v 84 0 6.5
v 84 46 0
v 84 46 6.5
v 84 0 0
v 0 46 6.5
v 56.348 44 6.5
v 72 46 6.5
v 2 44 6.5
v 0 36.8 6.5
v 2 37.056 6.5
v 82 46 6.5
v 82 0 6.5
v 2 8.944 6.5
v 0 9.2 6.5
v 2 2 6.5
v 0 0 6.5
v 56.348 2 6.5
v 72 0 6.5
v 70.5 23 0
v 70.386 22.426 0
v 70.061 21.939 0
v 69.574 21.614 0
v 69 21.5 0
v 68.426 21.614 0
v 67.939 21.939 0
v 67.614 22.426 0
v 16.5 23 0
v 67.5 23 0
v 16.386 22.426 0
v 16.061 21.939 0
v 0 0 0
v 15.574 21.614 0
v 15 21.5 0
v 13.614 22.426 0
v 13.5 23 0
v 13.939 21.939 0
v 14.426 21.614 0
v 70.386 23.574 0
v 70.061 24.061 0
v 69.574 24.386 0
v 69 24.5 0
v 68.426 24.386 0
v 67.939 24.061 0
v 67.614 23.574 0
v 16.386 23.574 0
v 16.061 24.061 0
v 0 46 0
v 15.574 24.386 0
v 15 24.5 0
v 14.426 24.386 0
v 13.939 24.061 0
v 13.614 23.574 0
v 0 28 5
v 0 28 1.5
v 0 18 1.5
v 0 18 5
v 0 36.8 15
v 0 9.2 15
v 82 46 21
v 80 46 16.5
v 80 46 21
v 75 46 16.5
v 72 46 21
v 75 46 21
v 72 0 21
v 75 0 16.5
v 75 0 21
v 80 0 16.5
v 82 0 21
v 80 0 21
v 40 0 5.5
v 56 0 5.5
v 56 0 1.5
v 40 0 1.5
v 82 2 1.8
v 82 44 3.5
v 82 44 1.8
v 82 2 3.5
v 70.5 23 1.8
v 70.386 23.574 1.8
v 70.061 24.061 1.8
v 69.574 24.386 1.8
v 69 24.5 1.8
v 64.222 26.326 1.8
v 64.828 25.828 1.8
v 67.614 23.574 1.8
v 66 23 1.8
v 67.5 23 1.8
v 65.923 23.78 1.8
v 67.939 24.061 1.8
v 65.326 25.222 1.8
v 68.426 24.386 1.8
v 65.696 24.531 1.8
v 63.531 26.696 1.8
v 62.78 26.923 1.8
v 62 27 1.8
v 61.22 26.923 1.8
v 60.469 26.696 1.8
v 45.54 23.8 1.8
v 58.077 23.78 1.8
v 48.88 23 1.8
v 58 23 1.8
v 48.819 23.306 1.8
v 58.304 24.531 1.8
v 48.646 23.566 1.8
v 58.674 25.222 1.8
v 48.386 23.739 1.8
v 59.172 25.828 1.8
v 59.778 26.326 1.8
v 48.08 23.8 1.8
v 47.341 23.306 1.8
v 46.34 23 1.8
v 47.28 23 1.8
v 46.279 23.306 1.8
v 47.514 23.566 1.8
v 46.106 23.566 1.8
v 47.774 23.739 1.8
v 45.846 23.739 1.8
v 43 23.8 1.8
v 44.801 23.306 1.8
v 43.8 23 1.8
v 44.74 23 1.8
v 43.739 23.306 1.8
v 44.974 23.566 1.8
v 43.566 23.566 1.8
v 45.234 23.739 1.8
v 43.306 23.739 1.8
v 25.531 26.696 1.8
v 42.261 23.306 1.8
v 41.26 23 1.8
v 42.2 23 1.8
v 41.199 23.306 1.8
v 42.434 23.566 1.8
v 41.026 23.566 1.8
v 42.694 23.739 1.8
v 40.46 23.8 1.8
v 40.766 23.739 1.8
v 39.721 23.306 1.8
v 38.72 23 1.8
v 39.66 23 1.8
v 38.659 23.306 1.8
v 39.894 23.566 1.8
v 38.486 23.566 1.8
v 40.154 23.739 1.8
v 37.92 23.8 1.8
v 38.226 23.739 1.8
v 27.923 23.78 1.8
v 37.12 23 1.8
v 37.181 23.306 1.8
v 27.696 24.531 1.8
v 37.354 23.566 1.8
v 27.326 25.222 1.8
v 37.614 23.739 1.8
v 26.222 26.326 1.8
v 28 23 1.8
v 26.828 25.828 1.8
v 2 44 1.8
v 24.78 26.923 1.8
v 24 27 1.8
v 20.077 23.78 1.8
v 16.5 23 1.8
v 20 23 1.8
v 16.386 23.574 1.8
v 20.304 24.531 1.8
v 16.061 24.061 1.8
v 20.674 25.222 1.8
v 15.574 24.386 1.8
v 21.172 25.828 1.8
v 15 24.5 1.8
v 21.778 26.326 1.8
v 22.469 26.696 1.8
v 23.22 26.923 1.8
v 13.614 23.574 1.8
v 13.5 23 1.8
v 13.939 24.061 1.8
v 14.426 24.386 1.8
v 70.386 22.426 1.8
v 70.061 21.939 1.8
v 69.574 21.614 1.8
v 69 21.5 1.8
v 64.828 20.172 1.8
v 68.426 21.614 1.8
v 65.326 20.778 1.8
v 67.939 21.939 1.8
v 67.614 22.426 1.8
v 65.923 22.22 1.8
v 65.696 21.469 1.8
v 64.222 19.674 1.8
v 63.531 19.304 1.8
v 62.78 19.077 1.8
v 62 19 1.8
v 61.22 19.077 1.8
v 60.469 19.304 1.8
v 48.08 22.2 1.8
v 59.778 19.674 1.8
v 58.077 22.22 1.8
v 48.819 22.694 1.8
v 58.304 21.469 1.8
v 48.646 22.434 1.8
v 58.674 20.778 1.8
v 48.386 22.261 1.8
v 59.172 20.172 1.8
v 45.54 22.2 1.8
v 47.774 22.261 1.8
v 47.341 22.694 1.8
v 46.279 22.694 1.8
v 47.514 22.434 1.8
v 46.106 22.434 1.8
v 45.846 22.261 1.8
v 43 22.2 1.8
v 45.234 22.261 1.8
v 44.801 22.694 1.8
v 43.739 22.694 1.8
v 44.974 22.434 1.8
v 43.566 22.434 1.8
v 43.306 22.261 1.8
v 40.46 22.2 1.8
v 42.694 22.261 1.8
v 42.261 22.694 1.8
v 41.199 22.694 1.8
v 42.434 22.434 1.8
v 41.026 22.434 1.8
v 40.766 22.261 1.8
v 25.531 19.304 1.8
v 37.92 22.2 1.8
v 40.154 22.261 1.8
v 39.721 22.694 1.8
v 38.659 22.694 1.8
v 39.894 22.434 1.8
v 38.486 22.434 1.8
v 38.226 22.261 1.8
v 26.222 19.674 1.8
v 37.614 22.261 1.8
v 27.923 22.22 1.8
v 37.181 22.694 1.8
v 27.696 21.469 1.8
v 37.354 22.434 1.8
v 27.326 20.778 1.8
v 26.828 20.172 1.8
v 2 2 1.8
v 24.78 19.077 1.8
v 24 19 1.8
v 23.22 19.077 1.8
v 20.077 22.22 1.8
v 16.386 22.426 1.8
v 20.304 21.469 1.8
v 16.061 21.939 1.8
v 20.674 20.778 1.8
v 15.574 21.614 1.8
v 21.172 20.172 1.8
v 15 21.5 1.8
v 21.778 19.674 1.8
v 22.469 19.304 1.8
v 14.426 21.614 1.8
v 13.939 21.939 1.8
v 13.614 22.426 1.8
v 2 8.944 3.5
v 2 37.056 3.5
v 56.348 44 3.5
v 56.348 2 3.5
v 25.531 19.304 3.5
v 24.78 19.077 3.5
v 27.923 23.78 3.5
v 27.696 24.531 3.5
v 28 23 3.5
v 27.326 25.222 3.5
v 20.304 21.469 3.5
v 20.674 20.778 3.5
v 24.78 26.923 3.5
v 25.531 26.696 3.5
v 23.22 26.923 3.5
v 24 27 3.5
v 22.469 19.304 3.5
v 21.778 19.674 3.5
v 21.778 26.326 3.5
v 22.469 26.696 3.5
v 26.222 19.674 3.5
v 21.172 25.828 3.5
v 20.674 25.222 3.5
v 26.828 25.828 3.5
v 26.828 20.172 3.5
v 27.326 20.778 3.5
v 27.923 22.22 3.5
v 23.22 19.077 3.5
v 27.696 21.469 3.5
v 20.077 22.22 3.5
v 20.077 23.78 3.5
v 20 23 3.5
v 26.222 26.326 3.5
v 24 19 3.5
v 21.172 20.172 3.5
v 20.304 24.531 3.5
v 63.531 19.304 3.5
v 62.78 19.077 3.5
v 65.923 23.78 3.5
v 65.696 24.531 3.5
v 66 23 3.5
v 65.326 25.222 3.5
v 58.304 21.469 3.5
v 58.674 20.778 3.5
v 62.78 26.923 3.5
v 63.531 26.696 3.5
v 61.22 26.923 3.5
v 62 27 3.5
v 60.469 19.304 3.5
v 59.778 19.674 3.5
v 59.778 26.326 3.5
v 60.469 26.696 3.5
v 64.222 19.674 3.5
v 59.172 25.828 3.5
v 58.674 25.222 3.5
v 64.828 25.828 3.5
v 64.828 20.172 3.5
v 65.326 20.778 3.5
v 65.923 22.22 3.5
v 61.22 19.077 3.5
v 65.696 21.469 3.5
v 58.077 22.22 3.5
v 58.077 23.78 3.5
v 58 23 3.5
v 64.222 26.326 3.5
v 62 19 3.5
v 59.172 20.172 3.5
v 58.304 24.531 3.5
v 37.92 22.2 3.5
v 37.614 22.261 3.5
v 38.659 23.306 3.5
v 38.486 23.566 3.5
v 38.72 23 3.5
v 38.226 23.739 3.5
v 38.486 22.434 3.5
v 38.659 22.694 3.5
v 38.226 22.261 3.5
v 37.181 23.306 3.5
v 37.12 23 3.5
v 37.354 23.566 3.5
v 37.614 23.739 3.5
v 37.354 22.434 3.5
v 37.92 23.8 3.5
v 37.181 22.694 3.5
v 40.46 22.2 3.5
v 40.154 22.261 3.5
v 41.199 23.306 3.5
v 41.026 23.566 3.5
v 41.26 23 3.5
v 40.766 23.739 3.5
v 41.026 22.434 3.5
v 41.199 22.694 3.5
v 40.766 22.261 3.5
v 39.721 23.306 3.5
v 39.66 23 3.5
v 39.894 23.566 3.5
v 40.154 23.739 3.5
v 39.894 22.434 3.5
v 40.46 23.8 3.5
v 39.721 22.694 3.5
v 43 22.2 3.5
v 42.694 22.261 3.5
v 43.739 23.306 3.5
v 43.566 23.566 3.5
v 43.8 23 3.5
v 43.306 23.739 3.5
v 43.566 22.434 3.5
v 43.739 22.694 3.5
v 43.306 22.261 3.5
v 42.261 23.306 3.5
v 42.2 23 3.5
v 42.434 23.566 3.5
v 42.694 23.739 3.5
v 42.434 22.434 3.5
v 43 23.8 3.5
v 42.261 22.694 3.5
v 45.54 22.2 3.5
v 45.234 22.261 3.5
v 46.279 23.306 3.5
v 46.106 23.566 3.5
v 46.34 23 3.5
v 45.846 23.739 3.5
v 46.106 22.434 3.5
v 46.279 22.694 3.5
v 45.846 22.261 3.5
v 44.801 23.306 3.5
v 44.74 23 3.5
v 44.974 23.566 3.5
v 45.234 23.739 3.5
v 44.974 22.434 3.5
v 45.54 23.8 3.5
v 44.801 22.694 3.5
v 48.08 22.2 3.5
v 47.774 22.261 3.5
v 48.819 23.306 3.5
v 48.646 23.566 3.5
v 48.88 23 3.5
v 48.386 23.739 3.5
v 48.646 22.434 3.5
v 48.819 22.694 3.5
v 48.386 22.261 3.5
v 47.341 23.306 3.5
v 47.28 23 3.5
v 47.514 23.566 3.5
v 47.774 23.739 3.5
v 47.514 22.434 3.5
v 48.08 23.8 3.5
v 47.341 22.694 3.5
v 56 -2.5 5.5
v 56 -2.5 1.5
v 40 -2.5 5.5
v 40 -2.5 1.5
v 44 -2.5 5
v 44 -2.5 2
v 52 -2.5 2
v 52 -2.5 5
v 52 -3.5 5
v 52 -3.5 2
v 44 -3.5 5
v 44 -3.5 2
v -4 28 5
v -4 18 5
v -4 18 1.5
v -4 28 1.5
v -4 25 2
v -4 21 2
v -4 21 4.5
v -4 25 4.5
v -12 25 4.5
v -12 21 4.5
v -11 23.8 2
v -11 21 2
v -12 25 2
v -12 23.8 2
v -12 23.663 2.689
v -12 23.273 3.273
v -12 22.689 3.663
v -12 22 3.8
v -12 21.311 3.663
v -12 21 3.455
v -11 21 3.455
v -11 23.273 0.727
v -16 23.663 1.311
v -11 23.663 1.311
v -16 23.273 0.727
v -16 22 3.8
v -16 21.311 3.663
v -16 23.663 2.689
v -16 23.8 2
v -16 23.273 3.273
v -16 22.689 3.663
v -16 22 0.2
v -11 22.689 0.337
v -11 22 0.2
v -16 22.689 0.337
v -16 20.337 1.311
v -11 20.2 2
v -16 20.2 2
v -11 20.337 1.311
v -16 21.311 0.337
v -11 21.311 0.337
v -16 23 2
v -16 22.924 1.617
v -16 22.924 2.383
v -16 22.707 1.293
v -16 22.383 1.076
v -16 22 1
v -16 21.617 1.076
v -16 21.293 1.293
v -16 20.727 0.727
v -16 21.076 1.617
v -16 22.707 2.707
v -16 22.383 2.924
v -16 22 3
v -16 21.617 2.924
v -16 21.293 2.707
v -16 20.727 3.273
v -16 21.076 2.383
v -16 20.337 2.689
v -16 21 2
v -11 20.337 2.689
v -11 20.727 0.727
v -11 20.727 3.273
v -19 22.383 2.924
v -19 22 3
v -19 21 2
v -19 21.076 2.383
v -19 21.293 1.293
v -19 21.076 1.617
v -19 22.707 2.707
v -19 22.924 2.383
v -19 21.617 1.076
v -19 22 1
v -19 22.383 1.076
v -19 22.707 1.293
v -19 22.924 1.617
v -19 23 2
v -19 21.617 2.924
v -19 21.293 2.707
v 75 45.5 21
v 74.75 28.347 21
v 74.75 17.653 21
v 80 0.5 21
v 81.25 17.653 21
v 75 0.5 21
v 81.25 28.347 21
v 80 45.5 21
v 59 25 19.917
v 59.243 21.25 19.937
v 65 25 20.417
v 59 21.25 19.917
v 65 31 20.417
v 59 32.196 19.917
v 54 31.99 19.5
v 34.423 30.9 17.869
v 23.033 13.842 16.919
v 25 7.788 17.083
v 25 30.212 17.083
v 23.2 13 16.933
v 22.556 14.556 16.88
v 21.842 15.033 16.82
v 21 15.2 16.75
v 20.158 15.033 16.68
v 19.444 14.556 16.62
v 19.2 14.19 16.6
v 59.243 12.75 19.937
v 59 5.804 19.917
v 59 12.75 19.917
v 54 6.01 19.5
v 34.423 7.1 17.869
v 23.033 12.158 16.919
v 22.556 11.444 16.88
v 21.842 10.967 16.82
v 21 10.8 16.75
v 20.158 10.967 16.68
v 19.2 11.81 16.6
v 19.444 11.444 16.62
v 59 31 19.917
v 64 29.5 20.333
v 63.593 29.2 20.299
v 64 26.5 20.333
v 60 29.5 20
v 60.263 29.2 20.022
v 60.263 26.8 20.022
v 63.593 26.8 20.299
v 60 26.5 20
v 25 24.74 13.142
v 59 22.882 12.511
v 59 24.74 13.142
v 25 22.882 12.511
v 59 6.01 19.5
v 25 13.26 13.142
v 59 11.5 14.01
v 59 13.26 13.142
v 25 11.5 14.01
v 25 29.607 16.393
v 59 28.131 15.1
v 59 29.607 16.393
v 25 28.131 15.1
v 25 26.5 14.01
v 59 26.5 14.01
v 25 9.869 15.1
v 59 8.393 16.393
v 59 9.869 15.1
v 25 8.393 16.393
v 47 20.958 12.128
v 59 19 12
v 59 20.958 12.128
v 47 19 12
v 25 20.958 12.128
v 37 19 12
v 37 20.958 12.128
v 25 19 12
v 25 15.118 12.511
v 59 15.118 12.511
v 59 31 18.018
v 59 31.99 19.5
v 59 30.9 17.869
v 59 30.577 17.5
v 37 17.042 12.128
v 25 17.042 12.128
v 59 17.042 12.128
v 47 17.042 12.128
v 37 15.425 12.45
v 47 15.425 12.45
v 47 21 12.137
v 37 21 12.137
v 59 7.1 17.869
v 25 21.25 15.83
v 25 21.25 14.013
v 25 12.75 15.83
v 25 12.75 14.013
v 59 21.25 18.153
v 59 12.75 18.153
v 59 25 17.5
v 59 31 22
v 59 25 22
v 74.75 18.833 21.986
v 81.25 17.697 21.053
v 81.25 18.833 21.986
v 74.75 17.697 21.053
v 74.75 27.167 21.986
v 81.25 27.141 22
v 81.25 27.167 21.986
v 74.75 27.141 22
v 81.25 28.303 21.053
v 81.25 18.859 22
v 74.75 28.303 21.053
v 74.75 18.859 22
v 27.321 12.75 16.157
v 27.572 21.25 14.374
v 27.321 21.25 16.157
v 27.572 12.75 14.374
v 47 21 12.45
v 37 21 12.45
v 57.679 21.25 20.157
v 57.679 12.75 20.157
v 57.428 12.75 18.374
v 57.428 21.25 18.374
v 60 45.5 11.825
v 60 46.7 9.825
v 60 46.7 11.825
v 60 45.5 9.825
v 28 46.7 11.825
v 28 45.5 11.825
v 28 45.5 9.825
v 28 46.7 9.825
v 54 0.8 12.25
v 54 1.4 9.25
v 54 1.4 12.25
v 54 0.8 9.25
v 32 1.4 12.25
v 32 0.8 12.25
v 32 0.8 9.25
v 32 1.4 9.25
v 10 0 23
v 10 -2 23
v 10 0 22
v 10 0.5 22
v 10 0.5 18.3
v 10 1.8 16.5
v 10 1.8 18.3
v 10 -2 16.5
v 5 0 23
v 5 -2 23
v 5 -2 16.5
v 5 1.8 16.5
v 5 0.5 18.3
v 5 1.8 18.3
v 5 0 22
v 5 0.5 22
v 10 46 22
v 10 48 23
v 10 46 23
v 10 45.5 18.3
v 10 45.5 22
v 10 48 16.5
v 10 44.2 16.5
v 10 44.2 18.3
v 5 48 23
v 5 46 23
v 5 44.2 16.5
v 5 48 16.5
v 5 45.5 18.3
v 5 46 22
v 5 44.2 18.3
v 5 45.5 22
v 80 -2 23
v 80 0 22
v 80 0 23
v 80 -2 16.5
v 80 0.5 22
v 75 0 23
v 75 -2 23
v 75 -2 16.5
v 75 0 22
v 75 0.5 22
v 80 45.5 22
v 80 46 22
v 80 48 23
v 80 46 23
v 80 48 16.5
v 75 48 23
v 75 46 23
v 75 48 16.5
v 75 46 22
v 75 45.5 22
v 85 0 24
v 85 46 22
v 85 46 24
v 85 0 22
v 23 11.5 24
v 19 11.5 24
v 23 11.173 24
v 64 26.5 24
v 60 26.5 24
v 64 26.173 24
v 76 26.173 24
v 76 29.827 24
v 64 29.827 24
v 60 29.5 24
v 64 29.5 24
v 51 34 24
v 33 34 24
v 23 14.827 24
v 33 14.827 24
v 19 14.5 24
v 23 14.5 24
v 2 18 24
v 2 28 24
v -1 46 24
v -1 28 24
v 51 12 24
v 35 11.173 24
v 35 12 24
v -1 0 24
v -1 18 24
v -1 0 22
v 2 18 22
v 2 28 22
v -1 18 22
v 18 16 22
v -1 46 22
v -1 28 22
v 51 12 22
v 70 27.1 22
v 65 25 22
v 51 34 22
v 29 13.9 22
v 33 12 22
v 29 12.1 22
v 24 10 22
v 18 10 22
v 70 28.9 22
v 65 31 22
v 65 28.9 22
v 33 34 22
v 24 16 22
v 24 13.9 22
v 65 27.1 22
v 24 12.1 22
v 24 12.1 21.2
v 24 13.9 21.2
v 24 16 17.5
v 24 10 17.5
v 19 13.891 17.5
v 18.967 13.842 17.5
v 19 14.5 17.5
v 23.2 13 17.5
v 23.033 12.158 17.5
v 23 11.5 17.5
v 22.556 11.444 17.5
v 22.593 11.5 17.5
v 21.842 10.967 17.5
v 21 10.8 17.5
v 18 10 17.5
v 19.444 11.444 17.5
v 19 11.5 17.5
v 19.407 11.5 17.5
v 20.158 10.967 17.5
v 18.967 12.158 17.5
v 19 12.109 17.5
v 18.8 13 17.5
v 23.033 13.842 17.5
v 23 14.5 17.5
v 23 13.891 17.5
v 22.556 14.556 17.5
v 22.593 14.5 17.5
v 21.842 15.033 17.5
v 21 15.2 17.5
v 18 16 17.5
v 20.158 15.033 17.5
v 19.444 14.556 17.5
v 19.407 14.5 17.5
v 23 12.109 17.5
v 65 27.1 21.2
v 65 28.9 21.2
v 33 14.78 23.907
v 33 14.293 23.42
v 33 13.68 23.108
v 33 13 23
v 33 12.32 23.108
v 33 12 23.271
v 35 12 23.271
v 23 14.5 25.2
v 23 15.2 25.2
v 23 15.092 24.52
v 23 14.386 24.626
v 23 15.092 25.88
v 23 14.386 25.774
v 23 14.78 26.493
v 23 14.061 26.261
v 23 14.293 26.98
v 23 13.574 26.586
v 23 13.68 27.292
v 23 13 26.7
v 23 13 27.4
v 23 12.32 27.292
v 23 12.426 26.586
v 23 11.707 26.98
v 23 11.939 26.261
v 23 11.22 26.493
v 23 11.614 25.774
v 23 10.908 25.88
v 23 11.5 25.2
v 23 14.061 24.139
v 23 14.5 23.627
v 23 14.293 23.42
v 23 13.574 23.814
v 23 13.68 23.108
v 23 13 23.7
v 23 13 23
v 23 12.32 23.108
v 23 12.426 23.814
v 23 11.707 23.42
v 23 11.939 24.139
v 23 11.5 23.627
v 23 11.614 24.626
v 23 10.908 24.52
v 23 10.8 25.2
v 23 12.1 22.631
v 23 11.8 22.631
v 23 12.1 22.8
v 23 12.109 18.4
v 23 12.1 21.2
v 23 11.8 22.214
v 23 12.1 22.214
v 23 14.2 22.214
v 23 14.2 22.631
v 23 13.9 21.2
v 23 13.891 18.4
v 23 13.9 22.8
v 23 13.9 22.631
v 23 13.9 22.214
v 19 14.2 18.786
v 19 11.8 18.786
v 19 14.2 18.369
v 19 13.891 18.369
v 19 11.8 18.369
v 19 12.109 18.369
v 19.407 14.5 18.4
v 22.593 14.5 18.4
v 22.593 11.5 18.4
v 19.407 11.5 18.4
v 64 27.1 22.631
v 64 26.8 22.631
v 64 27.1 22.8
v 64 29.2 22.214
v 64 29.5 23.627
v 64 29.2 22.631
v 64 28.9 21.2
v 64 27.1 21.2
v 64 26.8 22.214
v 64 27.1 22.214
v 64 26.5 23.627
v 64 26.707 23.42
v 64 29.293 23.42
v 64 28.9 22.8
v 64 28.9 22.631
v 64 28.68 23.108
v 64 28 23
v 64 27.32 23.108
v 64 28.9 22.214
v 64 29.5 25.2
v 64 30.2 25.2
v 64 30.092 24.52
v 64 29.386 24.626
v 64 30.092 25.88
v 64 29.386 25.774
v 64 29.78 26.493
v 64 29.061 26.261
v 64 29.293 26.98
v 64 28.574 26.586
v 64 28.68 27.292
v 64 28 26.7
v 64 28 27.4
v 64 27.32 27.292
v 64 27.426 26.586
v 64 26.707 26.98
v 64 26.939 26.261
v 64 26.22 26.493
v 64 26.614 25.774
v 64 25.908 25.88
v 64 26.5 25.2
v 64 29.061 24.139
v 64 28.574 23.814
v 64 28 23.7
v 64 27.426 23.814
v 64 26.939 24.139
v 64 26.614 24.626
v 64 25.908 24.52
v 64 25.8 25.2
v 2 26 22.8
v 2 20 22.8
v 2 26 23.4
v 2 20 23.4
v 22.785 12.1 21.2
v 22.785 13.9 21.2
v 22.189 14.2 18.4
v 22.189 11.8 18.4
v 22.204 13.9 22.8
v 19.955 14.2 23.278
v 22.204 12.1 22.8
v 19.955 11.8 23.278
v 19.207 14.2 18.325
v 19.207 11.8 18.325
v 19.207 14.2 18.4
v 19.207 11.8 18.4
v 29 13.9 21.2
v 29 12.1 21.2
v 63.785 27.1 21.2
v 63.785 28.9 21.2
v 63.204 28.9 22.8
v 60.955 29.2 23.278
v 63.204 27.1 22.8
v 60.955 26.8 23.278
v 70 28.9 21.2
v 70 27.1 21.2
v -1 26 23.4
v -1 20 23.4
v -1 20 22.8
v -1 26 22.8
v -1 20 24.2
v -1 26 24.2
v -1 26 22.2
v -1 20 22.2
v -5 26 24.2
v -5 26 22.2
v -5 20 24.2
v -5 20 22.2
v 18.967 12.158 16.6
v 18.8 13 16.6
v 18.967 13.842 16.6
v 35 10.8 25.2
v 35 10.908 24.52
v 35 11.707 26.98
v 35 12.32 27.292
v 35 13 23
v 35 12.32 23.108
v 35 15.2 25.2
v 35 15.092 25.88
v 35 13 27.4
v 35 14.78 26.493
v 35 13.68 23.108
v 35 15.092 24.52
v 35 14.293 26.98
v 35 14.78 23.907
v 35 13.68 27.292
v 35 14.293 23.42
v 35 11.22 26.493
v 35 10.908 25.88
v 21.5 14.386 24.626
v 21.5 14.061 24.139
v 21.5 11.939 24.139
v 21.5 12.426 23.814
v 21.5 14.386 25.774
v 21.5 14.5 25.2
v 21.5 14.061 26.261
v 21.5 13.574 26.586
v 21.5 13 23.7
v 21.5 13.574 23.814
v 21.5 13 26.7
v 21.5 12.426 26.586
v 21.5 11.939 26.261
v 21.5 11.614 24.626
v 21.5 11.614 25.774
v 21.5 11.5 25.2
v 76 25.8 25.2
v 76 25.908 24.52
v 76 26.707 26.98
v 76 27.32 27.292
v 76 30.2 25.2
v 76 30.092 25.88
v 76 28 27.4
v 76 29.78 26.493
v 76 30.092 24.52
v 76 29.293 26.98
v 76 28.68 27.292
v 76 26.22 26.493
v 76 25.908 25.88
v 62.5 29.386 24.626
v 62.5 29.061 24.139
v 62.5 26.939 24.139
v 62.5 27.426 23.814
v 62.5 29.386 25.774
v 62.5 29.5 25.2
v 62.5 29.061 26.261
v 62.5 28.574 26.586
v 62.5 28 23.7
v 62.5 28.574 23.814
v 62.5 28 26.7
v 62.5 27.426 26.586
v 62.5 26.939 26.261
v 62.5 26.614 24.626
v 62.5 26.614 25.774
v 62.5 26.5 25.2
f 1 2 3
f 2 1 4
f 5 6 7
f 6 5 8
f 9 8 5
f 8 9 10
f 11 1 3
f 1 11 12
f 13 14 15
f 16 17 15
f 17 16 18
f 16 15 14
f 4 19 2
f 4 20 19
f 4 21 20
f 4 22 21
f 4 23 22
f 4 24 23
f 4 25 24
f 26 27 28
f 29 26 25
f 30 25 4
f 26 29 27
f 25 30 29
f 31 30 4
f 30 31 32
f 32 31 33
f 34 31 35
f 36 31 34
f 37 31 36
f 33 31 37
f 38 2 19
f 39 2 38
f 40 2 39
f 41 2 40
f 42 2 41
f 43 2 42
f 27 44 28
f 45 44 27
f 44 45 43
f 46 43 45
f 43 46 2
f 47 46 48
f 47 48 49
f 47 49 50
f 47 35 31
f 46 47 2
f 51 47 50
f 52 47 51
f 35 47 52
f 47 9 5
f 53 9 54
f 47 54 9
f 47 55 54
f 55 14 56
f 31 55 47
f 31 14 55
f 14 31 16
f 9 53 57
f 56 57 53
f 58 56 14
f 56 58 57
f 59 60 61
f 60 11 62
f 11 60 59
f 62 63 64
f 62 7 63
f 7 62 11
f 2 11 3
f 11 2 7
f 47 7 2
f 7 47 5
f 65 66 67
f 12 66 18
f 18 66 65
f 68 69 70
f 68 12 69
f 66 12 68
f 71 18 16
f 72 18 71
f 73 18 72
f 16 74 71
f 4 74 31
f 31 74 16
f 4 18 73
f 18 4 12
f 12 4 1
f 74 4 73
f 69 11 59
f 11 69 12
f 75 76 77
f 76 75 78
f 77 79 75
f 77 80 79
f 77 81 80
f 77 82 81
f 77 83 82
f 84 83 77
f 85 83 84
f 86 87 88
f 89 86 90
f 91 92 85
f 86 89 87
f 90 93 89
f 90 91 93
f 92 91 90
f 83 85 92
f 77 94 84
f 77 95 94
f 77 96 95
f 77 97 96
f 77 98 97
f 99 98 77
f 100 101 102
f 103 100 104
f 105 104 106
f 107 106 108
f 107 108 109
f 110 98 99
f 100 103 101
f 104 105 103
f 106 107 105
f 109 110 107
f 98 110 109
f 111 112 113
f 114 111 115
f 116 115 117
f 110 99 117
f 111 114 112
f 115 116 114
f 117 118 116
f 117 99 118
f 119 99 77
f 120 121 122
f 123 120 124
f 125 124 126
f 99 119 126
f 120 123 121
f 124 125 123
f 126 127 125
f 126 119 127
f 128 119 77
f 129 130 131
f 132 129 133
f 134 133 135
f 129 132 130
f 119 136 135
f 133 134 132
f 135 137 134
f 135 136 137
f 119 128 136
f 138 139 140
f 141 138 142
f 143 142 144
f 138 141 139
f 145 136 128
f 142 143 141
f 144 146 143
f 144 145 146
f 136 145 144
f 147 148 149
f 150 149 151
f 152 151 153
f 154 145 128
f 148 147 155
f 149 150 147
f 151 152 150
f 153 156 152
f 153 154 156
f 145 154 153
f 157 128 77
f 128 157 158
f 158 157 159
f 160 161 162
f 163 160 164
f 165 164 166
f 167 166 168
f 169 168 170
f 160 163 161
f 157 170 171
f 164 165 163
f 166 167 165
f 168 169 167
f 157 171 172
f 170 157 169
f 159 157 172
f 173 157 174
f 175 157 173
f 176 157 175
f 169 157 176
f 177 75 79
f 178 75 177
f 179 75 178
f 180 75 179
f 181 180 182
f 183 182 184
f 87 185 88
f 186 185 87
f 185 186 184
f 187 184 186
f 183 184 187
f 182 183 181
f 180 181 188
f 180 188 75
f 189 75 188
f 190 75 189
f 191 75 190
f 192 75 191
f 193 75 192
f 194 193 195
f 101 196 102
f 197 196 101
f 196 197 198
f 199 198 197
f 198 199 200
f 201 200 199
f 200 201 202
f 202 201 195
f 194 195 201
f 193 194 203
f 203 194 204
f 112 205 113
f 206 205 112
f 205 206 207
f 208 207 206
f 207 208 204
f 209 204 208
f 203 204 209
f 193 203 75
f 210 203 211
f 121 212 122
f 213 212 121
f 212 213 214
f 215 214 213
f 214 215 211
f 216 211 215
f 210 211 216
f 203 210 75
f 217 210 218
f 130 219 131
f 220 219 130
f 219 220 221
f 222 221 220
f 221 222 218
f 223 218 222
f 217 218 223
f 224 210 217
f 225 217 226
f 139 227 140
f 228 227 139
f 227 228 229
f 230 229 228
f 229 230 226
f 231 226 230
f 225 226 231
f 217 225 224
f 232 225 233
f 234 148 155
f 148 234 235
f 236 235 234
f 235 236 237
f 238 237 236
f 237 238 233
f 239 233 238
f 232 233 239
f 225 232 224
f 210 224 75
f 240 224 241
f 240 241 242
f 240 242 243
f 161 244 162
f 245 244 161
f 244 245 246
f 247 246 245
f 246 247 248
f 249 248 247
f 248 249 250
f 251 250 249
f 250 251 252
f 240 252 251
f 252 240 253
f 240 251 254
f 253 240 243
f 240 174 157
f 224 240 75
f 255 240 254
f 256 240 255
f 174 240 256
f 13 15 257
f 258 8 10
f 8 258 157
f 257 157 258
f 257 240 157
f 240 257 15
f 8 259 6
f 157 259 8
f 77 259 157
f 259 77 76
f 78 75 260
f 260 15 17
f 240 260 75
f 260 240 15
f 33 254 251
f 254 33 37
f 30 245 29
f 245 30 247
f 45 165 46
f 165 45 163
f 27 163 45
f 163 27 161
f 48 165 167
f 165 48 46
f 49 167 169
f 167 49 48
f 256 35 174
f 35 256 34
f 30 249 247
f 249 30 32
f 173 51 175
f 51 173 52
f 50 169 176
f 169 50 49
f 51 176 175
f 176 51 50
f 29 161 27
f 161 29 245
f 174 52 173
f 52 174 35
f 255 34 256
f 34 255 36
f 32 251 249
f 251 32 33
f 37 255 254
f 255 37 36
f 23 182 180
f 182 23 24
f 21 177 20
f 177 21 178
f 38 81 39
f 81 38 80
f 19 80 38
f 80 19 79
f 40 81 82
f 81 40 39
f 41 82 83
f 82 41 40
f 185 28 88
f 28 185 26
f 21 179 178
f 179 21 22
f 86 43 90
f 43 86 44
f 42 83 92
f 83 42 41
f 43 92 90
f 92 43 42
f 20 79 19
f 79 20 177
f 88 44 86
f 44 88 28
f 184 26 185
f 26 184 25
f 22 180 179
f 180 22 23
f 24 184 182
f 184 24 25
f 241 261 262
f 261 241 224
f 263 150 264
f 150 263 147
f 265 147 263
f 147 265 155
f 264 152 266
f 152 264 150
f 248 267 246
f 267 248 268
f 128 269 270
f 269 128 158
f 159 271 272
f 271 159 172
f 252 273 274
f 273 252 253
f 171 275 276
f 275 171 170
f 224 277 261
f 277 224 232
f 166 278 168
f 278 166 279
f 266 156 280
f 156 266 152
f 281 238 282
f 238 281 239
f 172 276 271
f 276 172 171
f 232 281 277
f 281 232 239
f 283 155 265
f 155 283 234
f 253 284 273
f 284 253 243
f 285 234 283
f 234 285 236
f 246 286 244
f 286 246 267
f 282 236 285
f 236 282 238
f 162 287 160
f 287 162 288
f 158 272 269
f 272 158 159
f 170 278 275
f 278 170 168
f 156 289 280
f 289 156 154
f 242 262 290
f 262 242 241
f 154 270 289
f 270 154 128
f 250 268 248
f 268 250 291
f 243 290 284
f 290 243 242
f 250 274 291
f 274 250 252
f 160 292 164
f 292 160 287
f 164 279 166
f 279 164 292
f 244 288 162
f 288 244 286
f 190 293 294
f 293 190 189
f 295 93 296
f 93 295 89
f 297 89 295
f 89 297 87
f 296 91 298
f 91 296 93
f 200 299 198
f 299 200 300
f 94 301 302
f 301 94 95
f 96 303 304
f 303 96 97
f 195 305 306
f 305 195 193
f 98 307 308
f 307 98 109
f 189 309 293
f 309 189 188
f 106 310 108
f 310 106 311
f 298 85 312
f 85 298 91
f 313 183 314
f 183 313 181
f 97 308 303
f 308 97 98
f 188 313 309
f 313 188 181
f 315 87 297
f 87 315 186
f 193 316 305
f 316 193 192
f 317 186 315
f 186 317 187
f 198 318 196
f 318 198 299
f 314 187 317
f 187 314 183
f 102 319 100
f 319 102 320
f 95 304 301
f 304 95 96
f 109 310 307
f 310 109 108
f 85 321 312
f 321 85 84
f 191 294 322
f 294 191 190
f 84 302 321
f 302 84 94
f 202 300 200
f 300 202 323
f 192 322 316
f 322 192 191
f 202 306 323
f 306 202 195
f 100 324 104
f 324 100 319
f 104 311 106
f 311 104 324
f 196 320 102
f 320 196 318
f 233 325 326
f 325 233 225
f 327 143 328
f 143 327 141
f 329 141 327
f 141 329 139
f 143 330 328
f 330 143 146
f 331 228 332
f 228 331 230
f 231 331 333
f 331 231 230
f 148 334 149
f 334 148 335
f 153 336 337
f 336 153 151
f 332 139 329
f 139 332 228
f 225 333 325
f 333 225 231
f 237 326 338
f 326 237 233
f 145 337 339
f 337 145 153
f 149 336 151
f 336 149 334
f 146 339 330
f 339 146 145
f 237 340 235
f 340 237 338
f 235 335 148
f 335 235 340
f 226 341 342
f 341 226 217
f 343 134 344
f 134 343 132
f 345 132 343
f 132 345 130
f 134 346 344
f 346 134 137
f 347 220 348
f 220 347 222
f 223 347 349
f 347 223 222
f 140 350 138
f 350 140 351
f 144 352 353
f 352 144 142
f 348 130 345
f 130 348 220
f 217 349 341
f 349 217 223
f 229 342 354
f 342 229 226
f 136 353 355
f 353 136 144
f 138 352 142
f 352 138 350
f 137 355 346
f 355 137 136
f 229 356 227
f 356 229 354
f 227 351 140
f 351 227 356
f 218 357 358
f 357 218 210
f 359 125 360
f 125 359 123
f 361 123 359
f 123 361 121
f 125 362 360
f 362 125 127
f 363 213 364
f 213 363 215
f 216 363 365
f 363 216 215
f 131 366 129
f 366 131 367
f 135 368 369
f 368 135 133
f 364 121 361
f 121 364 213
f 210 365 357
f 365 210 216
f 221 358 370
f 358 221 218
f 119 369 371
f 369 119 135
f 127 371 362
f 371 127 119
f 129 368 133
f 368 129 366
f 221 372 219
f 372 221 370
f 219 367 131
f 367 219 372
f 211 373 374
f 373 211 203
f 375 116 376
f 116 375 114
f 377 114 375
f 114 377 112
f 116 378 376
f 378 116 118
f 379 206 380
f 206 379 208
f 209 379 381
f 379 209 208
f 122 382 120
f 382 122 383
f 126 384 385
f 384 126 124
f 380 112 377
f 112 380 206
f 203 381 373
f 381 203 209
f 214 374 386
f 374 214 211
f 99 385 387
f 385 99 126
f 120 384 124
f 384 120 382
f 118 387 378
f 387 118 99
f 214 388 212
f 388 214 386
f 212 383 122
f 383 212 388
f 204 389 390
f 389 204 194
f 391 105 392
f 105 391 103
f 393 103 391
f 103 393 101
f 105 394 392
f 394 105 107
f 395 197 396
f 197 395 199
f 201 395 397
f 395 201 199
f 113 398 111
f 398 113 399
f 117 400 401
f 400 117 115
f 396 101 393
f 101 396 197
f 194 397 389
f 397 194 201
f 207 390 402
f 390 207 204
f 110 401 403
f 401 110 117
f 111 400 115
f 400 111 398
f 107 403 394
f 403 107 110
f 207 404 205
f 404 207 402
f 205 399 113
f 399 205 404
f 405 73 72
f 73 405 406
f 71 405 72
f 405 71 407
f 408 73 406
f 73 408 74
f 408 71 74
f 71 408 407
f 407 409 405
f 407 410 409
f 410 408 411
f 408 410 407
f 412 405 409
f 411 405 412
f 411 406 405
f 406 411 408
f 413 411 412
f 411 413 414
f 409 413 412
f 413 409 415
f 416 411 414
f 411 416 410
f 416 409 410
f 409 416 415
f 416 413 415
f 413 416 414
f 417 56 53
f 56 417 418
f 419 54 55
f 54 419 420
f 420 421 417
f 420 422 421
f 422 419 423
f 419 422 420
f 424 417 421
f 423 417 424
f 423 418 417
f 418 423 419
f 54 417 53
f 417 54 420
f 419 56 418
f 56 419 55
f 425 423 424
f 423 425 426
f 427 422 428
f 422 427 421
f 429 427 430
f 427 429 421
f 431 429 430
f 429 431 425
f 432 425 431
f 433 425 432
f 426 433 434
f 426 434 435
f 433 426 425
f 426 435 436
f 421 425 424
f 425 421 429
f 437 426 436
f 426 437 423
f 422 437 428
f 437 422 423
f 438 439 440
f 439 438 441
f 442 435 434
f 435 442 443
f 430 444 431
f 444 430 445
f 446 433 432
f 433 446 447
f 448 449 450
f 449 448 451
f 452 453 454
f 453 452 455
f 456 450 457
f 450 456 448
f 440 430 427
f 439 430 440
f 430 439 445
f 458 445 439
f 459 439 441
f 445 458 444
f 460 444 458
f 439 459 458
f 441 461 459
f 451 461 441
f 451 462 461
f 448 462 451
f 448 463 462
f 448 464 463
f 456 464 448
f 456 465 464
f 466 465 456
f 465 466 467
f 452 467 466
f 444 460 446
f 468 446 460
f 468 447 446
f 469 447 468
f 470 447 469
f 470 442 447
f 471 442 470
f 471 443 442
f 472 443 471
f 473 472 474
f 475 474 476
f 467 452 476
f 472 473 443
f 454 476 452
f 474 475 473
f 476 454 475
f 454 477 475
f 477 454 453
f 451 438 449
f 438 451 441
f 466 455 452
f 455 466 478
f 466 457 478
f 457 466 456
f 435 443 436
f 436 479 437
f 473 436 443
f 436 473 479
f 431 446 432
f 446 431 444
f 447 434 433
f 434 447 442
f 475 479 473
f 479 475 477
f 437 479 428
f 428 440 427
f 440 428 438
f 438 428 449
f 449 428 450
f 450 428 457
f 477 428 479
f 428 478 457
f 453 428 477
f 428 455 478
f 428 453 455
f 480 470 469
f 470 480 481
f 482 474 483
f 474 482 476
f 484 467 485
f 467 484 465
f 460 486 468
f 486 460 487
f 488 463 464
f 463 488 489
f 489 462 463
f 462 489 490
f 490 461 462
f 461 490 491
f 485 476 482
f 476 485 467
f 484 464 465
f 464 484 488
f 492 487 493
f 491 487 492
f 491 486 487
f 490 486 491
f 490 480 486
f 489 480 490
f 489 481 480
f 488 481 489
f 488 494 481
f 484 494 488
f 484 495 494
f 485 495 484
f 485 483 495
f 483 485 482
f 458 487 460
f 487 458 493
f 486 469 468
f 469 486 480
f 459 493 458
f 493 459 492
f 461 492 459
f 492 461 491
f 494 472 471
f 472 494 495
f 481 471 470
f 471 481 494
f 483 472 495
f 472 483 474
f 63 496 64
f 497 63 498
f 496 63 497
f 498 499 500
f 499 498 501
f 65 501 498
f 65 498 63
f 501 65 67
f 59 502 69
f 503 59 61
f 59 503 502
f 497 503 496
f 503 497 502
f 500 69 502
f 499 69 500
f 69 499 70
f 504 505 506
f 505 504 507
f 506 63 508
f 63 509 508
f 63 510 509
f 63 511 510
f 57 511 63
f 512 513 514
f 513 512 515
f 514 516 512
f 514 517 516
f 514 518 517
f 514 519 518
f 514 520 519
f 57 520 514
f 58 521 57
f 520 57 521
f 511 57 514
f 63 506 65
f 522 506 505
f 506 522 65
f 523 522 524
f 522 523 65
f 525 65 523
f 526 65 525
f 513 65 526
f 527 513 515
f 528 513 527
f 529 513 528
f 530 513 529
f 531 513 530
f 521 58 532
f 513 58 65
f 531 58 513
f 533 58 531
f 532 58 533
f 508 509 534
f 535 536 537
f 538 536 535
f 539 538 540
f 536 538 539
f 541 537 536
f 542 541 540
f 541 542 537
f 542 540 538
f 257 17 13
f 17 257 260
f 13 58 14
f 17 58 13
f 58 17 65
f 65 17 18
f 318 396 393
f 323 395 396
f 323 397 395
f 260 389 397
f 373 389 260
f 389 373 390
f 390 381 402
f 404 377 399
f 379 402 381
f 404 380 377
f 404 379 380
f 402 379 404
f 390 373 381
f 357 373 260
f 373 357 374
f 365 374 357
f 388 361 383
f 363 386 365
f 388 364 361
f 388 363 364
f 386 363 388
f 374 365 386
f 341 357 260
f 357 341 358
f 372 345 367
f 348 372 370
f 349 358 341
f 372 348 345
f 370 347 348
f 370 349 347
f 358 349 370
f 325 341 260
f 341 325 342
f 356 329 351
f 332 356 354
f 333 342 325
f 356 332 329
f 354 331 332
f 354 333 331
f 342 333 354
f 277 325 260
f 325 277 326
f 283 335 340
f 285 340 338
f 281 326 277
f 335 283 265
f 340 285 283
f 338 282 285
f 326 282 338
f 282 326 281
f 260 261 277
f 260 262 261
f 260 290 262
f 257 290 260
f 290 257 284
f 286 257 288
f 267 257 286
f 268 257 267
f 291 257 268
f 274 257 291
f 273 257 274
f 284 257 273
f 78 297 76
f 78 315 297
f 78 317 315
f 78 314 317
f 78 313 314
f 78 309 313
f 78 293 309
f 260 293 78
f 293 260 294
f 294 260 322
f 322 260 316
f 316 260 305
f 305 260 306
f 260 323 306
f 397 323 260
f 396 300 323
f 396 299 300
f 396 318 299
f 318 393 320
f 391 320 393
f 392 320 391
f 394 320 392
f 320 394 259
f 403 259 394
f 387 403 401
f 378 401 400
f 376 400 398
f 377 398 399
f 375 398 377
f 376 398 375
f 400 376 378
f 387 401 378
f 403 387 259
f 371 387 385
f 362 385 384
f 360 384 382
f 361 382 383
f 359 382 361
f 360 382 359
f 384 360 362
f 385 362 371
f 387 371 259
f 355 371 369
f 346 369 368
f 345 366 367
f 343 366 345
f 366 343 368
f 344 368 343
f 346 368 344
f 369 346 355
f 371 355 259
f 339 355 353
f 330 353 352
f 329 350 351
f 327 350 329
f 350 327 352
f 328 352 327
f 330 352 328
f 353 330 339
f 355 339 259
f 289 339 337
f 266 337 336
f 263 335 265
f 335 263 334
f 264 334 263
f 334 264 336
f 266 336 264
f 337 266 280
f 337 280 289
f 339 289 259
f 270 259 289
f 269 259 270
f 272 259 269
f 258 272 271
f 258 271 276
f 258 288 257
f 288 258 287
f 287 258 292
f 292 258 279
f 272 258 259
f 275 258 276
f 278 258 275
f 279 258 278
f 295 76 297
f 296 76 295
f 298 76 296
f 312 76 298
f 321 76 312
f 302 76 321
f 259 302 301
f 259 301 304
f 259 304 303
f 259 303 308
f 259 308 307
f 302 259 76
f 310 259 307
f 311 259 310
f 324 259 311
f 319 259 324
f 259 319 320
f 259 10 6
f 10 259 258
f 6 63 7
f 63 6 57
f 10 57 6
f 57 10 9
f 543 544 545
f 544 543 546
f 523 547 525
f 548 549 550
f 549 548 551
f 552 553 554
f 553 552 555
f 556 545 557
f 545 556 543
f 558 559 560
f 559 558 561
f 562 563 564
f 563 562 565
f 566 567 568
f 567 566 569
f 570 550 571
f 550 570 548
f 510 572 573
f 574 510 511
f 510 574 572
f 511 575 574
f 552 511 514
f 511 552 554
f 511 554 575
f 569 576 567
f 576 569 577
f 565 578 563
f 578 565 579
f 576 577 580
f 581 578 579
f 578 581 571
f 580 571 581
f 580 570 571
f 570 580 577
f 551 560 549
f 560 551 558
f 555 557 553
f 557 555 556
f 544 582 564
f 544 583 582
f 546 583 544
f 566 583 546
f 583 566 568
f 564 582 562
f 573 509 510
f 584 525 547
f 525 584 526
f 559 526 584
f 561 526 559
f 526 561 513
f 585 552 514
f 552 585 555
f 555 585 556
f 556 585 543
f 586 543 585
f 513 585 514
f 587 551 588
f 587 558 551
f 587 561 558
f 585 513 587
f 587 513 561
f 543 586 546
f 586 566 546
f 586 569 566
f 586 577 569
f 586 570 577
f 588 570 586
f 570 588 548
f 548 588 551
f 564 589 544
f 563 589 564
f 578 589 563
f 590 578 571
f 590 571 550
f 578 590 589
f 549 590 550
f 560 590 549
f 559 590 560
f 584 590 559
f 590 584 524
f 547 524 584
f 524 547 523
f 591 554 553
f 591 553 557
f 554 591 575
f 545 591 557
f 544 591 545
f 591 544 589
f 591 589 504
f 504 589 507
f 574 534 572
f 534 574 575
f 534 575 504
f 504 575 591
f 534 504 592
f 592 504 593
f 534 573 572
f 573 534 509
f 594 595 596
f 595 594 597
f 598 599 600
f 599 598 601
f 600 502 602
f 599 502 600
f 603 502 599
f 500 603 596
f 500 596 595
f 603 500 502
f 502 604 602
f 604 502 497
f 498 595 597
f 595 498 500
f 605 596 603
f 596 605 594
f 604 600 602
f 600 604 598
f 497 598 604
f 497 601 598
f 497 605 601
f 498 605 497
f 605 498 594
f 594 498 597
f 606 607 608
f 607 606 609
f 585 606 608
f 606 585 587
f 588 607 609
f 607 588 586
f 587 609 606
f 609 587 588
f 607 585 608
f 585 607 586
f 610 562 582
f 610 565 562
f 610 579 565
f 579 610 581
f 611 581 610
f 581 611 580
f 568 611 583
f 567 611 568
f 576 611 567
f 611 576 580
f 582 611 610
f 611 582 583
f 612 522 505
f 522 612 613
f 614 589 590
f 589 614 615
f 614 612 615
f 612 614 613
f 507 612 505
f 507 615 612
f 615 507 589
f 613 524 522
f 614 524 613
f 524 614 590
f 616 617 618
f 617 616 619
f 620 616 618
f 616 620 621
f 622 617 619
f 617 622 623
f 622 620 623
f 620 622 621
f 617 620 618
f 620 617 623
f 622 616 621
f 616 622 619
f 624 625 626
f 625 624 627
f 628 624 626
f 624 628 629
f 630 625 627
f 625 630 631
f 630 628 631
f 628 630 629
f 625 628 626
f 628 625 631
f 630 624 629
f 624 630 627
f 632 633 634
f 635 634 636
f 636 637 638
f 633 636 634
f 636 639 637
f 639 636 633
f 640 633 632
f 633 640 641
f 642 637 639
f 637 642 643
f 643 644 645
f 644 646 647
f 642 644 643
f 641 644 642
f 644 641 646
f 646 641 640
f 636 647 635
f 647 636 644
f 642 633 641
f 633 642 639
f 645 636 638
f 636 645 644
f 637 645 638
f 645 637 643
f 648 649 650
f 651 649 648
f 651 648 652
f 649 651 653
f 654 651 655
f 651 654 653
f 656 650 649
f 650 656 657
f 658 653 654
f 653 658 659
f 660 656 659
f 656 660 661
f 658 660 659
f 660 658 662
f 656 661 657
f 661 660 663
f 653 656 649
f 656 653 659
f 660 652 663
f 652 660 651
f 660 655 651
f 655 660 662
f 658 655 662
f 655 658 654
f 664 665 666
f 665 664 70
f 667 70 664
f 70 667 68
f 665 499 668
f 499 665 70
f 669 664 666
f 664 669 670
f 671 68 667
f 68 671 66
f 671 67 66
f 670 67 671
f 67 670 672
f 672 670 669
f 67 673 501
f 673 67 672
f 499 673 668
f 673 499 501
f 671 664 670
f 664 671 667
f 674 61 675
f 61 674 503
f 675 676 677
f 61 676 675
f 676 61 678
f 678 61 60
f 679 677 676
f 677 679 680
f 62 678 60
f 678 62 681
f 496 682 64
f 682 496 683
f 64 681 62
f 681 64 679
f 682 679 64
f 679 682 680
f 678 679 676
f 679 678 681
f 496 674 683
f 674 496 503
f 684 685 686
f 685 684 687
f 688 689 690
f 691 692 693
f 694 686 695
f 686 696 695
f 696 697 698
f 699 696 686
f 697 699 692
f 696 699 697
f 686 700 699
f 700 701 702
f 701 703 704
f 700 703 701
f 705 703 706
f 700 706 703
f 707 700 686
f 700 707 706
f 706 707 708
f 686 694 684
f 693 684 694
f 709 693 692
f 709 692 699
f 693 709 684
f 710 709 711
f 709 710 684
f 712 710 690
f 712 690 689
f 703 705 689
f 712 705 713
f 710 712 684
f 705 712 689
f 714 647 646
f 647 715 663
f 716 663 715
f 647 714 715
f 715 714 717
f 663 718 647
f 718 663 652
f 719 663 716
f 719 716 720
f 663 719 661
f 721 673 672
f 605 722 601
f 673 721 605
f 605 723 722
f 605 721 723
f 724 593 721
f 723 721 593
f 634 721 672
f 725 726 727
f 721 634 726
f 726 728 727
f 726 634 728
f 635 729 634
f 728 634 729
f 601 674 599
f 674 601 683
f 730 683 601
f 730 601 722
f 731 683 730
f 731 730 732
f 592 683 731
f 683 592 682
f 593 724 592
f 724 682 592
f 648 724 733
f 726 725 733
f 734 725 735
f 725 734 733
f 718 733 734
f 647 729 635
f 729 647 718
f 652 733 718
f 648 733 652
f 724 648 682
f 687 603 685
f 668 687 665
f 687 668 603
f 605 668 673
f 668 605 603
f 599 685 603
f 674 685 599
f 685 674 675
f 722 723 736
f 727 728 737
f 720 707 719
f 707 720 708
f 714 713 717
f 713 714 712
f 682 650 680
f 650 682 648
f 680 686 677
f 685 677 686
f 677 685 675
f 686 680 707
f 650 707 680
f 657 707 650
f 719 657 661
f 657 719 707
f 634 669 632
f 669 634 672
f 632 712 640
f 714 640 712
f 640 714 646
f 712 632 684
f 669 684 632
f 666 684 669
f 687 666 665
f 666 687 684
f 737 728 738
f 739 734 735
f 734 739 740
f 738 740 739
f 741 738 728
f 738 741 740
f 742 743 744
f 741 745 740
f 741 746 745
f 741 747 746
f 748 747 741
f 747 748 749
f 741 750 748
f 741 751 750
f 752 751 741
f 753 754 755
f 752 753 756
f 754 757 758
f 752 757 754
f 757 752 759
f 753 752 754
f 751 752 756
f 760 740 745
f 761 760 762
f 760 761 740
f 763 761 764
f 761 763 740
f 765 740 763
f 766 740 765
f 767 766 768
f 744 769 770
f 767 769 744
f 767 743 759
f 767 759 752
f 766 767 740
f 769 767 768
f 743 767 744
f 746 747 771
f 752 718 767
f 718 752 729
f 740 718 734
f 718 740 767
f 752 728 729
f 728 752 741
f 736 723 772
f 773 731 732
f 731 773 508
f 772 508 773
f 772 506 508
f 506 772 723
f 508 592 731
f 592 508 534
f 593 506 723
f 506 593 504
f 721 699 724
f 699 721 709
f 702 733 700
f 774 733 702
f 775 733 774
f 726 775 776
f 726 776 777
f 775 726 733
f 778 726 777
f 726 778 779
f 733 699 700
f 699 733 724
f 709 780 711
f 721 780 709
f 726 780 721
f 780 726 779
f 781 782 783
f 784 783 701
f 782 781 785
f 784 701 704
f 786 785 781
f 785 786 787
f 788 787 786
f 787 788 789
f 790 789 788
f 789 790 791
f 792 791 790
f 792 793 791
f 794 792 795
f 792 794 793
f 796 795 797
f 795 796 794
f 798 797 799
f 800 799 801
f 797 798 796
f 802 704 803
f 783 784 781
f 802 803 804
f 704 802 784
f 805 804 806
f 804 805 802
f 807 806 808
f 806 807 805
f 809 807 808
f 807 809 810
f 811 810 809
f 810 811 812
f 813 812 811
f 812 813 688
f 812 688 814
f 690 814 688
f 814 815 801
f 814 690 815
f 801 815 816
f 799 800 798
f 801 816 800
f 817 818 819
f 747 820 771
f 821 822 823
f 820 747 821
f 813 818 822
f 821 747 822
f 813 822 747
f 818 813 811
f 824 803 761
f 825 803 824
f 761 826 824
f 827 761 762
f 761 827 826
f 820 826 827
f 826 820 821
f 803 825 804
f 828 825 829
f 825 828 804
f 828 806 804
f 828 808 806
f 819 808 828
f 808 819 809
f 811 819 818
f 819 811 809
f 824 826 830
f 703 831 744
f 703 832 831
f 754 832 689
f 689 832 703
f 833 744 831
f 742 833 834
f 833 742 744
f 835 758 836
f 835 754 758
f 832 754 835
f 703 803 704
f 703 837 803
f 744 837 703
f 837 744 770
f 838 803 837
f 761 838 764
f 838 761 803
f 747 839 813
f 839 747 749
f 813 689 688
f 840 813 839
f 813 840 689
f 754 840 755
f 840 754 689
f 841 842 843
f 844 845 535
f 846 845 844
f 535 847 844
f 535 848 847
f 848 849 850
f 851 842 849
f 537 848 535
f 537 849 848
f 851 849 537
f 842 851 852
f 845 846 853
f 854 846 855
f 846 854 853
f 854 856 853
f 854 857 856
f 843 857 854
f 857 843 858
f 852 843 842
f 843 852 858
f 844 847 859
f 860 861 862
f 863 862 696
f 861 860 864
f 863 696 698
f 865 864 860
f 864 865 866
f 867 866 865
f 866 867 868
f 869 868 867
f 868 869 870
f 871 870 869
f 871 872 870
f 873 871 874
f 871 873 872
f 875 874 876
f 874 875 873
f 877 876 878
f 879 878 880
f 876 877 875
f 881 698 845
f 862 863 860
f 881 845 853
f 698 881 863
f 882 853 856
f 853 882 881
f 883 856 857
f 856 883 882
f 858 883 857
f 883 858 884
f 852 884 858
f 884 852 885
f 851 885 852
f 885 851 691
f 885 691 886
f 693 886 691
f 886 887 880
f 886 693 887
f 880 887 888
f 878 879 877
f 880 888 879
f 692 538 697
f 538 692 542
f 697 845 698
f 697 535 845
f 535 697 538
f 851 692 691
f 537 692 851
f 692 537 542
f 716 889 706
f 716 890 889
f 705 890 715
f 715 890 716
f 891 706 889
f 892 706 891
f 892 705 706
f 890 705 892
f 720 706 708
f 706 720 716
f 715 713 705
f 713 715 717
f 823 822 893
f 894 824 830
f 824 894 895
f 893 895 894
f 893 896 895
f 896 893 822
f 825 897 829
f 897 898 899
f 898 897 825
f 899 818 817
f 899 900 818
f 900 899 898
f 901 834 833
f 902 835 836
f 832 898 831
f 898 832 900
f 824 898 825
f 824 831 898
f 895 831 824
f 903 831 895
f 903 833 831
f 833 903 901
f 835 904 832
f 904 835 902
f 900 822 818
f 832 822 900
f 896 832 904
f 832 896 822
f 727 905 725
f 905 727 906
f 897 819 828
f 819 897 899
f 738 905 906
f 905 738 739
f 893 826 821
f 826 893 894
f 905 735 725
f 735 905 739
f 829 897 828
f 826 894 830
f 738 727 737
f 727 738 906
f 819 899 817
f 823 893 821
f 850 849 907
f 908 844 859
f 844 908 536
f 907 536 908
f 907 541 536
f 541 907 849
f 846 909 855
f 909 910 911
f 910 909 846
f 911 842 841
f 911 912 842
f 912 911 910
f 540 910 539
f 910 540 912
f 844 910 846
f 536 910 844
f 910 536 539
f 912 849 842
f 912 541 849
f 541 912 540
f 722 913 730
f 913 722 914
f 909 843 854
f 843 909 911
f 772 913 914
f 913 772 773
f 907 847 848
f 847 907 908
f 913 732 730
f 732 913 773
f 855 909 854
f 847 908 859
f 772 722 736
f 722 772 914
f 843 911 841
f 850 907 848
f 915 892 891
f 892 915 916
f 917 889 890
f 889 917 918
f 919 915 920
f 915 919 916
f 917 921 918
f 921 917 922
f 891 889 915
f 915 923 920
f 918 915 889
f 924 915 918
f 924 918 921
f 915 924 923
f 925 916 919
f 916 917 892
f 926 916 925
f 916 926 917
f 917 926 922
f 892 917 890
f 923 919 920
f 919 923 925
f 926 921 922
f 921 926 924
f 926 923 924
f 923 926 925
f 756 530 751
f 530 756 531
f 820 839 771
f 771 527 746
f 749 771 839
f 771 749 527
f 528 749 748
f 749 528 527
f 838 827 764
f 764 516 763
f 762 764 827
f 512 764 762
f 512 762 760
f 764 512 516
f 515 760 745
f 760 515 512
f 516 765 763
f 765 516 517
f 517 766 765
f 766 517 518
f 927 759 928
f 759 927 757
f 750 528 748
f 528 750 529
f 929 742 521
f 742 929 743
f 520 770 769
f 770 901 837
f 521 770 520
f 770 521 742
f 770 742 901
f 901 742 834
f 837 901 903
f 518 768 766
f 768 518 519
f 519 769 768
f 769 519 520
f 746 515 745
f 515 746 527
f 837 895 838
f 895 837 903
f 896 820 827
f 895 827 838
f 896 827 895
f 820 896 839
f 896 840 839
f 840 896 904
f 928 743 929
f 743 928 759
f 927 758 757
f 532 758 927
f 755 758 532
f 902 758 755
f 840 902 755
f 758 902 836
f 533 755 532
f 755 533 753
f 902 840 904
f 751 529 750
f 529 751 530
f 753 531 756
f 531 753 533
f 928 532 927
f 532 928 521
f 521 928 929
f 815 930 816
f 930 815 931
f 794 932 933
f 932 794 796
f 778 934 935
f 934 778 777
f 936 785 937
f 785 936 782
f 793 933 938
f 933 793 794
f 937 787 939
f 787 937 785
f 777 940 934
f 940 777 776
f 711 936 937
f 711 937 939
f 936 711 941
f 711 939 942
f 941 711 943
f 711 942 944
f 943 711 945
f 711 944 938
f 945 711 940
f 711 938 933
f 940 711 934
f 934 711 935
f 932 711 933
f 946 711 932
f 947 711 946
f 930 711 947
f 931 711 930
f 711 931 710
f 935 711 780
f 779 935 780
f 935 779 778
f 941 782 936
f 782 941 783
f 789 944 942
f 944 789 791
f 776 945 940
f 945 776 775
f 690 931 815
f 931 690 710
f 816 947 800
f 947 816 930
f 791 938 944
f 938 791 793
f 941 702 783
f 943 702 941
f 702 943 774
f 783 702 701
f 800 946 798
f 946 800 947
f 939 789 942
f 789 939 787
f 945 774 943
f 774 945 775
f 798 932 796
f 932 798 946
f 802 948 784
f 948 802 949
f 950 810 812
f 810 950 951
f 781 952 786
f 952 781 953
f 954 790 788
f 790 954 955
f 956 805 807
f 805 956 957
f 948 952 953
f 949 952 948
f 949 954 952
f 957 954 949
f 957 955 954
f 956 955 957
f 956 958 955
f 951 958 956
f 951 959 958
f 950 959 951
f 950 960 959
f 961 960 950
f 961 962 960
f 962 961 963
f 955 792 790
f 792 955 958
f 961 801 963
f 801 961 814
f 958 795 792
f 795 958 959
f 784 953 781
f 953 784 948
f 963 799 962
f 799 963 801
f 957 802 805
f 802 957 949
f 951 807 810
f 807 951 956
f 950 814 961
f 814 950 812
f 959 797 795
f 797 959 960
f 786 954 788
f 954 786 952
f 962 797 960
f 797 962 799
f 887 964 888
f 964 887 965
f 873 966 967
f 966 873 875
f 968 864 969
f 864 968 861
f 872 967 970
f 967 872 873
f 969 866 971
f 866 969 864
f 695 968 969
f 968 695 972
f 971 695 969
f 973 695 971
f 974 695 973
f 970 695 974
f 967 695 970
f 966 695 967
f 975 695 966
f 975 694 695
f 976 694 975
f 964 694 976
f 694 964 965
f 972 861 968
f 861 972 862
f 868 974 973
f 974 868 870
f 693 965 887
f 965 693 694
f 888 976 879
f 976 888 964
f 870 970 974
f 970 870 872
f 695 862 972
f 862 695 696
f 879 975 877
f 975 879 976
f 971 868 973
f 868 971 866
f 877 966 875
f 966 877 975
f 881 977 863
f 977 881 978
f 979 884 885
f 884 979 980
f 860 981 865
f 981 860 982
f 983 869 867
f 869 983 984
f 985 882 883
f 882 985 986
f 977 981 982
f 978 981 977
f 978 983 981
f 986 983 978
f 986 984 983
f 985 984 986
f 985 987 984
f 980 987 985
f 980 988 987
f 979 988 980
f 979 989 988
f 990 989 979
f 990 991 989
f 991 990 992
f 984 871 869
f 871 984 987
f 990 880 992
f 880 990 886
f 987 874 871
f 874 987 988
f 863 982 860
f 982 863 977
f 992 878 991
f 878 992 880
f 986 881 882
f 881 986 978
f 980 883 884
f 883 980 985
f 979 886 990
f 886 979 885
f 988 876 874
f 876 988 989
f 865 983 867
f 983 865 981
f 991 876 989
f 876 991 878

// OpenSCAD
// =============================================================================
// OpenMotorBridge - Satellite Pod: Low-Profile 2D Rocker Actuator Plate
// =============================================================================
// File: hardware/cad/scad/02_pod_base/parts/012_universal_actuator_slide_bracket.scad
// Description: Ultra-low-profile mechatronic 2D dual-rocker actuator plate
//              for automatic ignition-coupled Power-On / Power-Off (KL15).
//
// Solves:
// 1. Hardware Reality: Sena and Cardo DO NOT have USB-Power-On or BLE-Wakeup
//    when turned OFF. To power on/off with ignition, 2 buttons MUST be pressed!
// 2. Vertical Headroom: Pod interior is 32 mm, Cardo crest is 21.5 mm -> only 10.5 mm
//    clearance to lid! Vertical solenoids collide. This plate uses FLAT HORIZONTAL
//    micro-actuators with 90° downward rockers (total height only 6.5 mm!).
// 3. 2D Button Staggering: Cardo buttons are not 1D!
//    - Front Media Key: X = 22.0 mm, Y = 13.0 mm (narrow nose)
//    - Rear Intercom Key: X = 63.0 mm, Y = 28.0 mm (wide rear) -> 15 mm Y-offset!
// 4. Downward Pivot Domes: Domes and lever journals point DOWNWARD into the
//    negative space beside the keys, keeping the top surface 100% flush.
// 5. Positive Clamping & Routing: Plate clips securely onto the OEM Air-Mount cradle;
//    flat flex cable routes forward under the dry-flap to J_ACT on PCBA 03.
// =============================================================================

include <../../00_common/parameters.scad>;
use <../../00_common/dummies/dummy_intercom_units.scad>;

$fn = 32;

// Ultra-Flat 2D Dual-Rocker Actuator Plate
module cardo_edge_2d_rocker_plate(show_actuators = true) {
    plate_l = 86.0;
    plate_w = 46.0;
    plate_th = 2.0;

    // 1. Contoured Main Carrier Plate (Molded in Matte Anthracite PA12)
    color([0.22, 0.24, 0.27]) {
        difference() {
            union() {
                // Main low-profile deck
                translate([0, 0, 0])
                    cube([plate_l, plate_w, plate_th], center=false);

                // 4x Downward Snap-Claw Clips (Snaps onto OEM Air-Mount cradle perimeter)
                for (cx = [6.0, plate_l - 10.0]) {
                    // Left flank snap arms
                    translate([cx, -2.0, -5.5])
                        cube([5.0, 2.5, 6.5], center=false);
                    translate([cx, -2.0, -5.5])
                        rotate([0, 0, 0])
                            cube([5.0, 3.8, 1.8], center=false); // snap barb

                    // Right flank snap arms
                    translate([cx, plate_w - 0.5, -5.5])
                        cube([5.0, 2.5, 6.5], center=false);
                    translate([cx, plate_w - 1.8, -5.5])
                        cube([5.0, 3.8, 1.8], center=false); // snap barb
                }

                // Downward-pointing pivot bearing journals (Dome nach UNTEN!)
                // Front Lever 1 Journal at X = 22.0, Y = 13.0
                translate([19.0, 10.0, -4.5])
                    cube([6.0, 6.0, 5.0], center=false);

                // Rear Lever 2 Journal at X = 63.0, Y = 28.0 (15 mm lateral offset!)
                translate([60.0, 25.0, -4.5])
                    cube([6.0, 6.0, 5.0], center=false);
            }

            // Cutout window over Cardo center phone button & status LEDs
            translate([34.0, 12.0, -1.0])
                cube([18.0, 22.0, plate_th + 2.0], center=false);

            // Front Rocker Slot (X = 22.0 mm, Y = 13.0 mm)
            translate([20.0, 11.5, -5.0])
                cube([4.0, 3.0, 8.0], center=false);

            // Rear Rocker Slot (X = 63.0 mm, Y = 28.0 mm)
            translate([61.0, 26.5, -5.0])
                cube([4.0, 3.0, 8.0], center=false);

            // Cable exit chamfer at front nose
            translate([-1.0, 18.0, -1.0])
                cube([4.0, 10.0, plate_th + 2.0], center=false);
        }
    }

    if (show_actuators) {
        // 2. Front 90° Bellcrank Rocker Arm (Orange Anodized Aluminum)
        // Positioned at X = 22.0 mm, Y = 13.0 mm (Media / Power Key)
        color([0.92, 0.45, 0.10]) {
            translate([22.0, 13.0, -1.5]) {
                // Rocker body
                rotate([0, 12, 0])
                    cube([3.2, 2.4, 5.0], center=true);
                // Horizontal pull link
                translate([4.0, 0, 1.5])
                    cube([8.0, 1.8, 1.6], center=true);
            }
        }
        // Front Soft Shore A50 TPU Pusher Tip (Pushover Media Key)
        color([1.0, 0.6, 0.1])
            translate([22.0, 13.0, -4.5])
                cylinder(r=2.2, h=1.8, center=true, $fn=16);

        // 3. Rear 90° Bellcrank Rocker Arm (Blue Anodized Aluminum)
        // Positioned at X = 63.0 mm, Y = 28.0 mm (Intercom / Power Key - 15 mm Y-Offset!)
        color([0.15, 0.48, 0.88]) {
            translate([63.0, 28.0, -1.5]) {
                // Rocker body
                rotate([0, 12, 0])
                    cube([3.2, 2.4, 5.0], center=true);
                // Horizontal pull link
                translate([4.0, 0, 1.5])
                    cube([8.0, 1.8, 1.6], center=true);
            }
        }
        // Rear Soft Shore A50 TPU Pusher Tip (Pushover Intercom Key)
        color([0.2, 0.7, 1.0])
            translate([63.0, 28.0, -4.5])
                cylinder(r=2.2, h=1.8, center=true, $fn=16);

        // 4. Flat Horizontal Micro-Solenoid / Linear Actuators (Flachliegend: nur 5.0 mm hoch!)
        // Actuator 1 (Front, driving Media rocker)
        color("silver")
            translate([30.0, 13.0, plate_th + 1.2])
                rotate([0, 90, 0])
                    cylinder(r=2.2, h=12.0, center=true, $fn=20);
        color("gold")
            translate([24.0, 13.0, plate_th + 1.2])
                rotate([0, 90, 0])
                    cylinder(r=1.5, h=3.0, center=true, $fn=16);

        // Actuator 2 (Rear, driving Intercom rocker)
        color("silver")
            translate([71.0, 28.0, plate_th + 1.2])
                rotate([0, 90, 0])
                    cylinder(r=2.2, h=12.0, center=true, $fn=20);
        color("gold")
            translate([65.0, 28.0, plate_th + 1.2])
                rotate([0, 90, 0])
                    cylinder(r=1.5, h=3.0, center=true, $fn=16);

        // 5. Flat Actuator Ribbon Cable (routes forward under dry-flap to J_ACT on PCBA 03)
        color([0.15, 0.15, 0.15]) {
            translate([0, 20.0, 0.8])
                cube([30.0, 6.0, 0.6], center=false);
            // JST-SH 8-Pin connector plug
            translate([-4.0, 20.0, 0.2])
                cube([4.0, 6.0, 2.0], center=false);
        }
    }
}

// Complete assembly: Cardo Packtalk Edge WITH 2D Rocker Plate clicked into cradle
module cardo_with_2d_rocker_plate_assembly() {
    // A. Cardo OEM Air-Mount Cradle (Screwed to pod floor)
    dummy_cardo_oem_airmount_cradle();

    // B. Cardo Packtalk Edge (Docked inside cradle)
    translate([0, 0, 3.5])
        dummy_cardo_packtalk_edge(with_actuators = false);

    // C. Ultra-Flat 2D Dual-Rocker Plate (Clicked onto cradle, height = only 6.5 mm!)
    translate([-1.0, 0, 22.0])
        cardo_edge_2d_rocker_plate(show_actuators = true);
}

// Standalone execution preview
cardo_with_2d_rocker_plate_assembly();
